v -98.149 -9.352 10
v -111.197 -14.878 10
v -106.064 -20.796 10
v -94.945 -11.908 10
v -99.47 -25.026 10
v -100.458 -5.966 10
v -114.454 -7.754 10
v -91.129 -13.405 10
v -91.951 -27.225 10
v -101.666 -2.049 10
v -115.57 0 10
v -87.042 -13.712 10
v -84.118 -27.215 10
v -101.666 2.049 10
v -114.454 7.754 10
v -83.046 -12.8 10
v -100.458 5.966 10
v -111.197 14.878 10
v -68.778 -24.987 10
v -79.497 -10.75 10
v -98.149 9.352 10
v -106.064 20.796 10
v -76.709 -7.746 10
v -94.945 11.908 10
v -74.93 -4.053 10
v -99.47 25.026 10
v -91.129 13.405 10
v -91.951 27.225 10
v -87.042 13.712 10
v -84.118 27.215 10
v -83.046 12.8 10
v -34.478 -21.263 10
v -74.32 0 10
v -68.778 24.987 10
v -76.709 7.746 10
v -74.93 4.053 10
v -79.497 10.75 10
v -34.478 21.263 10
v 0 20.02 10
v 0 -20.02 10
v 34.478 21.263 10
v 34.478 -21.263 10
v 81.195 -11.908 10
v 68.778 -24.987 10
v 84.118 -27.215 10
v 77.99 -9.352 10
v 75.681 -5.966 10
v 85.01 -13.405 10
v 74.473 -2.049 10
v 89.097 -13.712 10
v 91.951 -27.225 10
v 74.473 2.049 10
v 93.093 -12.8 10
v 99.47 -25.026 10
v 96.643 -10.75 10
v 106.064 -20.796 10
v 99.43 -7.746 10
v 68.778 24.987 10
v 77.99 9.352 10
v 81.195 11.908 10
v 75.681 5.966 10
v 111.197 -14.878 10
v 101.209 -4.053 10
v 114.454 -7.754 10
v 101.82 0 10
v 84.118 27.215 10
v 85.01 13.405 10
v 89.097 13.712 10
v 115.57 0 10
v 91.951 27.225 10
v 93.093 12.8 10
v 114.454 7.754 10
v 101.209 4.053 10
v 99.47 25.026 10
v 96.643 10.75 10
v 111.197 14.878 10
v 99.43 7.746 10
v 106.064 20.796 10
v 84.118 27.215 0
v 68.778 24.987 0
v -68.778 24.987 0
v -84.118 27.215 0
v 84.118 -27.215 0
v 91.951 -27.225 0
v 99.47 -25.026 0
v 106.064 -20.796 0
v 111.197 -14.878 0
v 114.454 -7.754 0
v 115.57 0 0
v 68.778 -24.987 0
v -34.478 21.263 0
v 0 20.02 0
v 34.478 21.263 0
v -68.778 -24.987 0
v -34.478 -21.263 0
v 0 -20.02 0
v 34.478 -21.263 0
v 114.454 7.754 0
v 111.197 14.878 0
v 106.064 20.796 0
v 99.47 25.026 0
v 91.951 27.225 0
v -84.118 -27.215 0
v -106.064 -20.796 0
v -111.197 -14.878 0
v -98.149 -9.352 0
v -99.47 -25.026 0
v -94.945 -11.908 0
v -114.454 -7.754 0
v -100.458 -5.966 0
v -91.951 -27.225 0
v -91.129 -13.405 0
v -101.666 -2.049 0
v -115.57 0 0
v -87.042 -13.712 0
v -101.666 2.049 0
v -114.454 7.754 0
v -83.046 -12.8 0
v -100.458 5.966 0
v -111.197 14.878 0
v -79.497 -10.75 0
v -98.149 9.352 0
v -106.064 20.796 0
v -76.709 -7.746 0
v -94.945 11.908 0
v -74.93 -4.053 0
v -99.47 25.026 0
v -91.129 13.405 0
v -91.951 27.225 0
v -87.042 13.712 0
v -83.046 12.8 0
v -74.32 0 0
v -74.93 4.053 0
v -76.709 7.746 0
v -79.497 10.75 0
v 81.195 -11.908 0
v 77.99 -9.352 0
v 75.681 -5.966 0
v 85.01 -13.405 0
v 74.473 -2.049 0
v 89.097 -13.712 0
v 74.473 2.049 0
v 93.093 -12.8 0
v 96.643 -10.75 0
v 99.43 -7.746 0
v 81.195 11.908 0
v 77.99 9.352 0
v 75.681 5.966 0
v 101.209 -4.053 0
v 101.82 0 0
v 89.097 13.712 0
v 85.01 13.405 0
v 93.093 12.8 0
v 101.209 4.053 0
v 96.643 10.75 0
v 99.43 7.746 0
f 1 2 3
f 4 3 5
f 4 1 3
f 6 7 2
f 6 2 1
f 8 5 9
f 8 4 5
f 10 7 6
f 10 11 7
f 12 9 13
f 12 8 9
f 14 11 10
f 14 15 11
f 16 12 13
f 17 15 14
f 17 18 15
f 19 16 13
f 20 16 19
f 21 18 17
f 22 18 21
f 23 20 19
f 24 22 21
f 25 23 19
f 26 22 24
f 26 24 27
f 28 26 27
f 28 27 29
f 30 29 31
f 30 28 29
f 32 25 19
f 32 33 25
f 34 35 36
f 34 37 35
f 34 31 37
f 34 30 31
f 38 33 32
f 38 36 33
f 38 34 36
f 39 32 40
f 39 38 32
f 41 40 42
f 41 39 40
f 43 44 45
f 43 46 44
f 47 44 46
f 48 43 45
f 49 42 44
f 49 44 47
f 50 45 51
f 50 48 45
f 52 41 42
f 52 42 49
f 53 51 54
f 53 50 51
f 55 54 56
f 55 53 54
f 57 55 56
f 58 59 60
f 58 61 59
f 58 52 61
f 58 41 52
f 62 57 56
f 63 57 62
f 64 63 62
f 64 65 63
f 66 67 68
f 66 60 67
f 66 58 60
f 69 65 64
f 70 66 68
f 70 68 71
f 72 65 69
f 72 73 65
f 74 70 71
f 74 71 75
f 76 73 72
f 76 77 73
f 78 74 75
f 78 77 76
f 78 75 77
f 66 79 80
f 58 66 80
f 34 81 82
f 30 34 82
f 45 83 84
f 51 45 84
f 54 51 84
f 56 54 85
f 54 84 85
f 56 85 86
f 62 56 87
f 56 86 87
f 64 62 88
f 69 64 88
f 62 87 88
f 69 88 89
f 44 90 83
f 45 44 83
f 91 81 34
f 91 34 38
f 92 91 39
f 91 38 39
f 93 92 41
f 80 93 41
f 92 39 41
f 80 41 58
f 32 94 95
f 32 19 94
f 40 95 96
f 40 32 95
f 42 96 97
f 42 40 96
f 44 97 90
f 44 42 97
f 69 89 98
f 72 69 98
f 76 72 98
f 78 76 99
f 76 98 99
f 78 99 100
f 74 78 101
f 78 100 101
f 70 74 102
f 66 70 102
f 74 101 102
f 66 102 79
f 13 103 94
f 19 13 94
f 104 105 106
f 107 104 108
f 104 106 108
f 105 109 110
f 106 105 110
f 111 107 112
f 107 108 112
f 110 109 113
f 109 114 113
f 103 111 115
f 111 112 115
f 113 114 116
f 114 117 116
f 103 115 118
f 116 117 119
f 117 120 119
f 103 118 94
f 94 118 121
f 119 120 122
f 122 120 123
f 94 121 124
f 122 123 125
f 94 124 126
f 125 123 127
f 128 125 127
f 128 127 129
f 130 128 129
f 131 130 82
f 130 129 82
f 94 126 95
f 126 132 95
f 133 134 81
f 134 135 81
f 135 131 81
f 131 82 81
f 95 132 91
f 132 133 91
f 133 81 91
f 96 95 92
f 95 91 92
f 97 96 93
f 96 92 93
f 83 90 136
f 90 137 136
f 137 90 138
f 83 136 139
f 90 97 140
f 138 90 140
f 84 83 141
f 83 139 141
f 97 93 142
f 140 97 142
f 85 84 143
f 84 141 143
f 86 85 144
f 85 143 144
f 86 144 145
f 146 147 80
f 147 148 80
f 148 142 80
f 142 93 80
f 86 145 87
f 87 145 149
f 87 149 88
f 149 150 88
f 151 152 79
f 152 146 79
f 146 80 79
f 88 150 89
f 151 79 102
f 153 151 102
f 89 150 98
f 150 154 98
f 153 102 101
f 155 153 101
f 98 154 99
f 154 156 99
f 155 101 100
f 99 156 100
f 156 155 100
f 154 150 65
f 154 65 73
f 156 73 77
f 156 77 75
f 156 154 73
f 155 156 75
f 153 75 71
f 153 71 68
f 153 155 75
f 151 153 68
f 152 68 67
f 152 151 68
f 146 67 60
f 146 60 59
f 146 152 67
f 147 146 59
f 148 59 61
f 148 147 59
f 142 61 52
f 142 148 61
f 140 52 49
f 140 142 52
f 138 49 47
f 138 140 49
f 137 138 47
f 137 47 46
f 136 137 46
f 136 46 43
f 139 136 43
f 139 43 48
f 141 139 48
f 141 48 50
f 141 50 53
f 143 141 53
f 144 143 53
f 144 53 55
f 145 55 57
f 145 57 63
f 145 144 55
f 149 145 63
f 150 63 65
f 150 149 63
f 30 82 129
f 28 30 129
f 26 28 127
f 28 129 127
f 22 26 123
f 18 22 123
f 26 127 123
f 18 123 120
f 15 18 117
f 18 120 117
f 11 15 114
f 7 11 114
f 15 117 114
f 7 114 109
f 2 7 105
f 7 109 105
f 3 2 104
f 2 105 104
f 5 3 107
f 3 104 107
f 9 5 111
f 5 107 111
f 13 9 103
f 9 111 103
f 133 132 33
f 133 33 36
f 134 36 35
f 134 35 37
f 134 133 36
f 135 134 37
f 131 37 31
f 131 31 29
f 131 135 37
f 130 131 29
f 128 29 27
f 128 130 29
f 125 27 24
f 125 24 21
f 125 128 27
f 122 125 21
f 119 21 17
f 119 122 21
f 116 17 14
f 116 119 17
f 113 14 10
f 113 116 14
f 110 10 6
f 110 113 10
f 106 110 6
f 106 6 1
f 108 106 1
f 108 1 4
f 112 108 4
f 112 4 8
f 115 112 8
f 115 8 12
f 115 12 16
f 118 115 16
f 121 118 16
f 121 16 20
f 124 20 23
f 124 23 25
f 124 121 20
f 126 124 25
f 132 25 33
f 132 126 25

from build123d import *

# Parameters (mm, degrees)
F0_R     = 13.75
F1_DEPTH = 10
F2_R     = 478.617491


with BuildPart() as f1:
    # F0 (on Top) → F1 (new body)
    with BuildSketch(Plane.XY):
        with BuildLine():
            ThreePointArc((-84.117798, 27.214582), (-67.273856, 17.994112), (-60.569575, 0))
            ThreePointArc((-60.569575, 0), (-67.273856, -17.994112), (-84.117798, -27.214582))
            Line((-84.117798, -27.214582), (0, -15))
            Line((0, -15), (84.117798, -27.214582))
            ThreePointArc((84.117798, -27.214582), (60.569575, 0), (84.117798, 27.214582))
            Line((84.117798, 27.214582), (0, 15))
            Line((0, 15), (-84.117798, 27.214582))
        make_face()
        with BuildLine():
            ThreePointArc((-84.117798, -27.214582), (-67.273856, -17.994112), (-60.569575, 0))
            ThreePointArc((-60.569575, 0), (-67.273856, 17.994112), (-84.117798, 27.214582))
            ThreePointArc((-84.117798, 27.214582), (-115.569575, 0), (-84.117798, -27.214582))
        make_face()
        with Locations((-88.069575, 0)):
            Circle(F0_R, mode=Mode.SUBTRACT)
        with BuildLine():
            ThreePointArc((115.569575, 0), (106.063687, 20.795719), (84.117798, 27.214582))
            ThreePointArc((84.117798, 27.214582), (60.569575, 0), (84.117798, -27.214582))
            ThreePointArc((84.117798, -27.214582), (106.063687, -20.795719), (115.569575, 0))
        make_face()
        with Locations((88.069575, 0)):
            Circle(F0_R, mode=Mode.SUBTRACT)
    extrude(amount=F1_DEPTH)

    # F2
    f2_edges = [f1.edges().sort_by_distance(p)[0] for p in [
        (0, -15, 5),
        (0, 15, 5),
    ]]
    fillet(f2_edges, radius=F2_R)


solid = f1.part
